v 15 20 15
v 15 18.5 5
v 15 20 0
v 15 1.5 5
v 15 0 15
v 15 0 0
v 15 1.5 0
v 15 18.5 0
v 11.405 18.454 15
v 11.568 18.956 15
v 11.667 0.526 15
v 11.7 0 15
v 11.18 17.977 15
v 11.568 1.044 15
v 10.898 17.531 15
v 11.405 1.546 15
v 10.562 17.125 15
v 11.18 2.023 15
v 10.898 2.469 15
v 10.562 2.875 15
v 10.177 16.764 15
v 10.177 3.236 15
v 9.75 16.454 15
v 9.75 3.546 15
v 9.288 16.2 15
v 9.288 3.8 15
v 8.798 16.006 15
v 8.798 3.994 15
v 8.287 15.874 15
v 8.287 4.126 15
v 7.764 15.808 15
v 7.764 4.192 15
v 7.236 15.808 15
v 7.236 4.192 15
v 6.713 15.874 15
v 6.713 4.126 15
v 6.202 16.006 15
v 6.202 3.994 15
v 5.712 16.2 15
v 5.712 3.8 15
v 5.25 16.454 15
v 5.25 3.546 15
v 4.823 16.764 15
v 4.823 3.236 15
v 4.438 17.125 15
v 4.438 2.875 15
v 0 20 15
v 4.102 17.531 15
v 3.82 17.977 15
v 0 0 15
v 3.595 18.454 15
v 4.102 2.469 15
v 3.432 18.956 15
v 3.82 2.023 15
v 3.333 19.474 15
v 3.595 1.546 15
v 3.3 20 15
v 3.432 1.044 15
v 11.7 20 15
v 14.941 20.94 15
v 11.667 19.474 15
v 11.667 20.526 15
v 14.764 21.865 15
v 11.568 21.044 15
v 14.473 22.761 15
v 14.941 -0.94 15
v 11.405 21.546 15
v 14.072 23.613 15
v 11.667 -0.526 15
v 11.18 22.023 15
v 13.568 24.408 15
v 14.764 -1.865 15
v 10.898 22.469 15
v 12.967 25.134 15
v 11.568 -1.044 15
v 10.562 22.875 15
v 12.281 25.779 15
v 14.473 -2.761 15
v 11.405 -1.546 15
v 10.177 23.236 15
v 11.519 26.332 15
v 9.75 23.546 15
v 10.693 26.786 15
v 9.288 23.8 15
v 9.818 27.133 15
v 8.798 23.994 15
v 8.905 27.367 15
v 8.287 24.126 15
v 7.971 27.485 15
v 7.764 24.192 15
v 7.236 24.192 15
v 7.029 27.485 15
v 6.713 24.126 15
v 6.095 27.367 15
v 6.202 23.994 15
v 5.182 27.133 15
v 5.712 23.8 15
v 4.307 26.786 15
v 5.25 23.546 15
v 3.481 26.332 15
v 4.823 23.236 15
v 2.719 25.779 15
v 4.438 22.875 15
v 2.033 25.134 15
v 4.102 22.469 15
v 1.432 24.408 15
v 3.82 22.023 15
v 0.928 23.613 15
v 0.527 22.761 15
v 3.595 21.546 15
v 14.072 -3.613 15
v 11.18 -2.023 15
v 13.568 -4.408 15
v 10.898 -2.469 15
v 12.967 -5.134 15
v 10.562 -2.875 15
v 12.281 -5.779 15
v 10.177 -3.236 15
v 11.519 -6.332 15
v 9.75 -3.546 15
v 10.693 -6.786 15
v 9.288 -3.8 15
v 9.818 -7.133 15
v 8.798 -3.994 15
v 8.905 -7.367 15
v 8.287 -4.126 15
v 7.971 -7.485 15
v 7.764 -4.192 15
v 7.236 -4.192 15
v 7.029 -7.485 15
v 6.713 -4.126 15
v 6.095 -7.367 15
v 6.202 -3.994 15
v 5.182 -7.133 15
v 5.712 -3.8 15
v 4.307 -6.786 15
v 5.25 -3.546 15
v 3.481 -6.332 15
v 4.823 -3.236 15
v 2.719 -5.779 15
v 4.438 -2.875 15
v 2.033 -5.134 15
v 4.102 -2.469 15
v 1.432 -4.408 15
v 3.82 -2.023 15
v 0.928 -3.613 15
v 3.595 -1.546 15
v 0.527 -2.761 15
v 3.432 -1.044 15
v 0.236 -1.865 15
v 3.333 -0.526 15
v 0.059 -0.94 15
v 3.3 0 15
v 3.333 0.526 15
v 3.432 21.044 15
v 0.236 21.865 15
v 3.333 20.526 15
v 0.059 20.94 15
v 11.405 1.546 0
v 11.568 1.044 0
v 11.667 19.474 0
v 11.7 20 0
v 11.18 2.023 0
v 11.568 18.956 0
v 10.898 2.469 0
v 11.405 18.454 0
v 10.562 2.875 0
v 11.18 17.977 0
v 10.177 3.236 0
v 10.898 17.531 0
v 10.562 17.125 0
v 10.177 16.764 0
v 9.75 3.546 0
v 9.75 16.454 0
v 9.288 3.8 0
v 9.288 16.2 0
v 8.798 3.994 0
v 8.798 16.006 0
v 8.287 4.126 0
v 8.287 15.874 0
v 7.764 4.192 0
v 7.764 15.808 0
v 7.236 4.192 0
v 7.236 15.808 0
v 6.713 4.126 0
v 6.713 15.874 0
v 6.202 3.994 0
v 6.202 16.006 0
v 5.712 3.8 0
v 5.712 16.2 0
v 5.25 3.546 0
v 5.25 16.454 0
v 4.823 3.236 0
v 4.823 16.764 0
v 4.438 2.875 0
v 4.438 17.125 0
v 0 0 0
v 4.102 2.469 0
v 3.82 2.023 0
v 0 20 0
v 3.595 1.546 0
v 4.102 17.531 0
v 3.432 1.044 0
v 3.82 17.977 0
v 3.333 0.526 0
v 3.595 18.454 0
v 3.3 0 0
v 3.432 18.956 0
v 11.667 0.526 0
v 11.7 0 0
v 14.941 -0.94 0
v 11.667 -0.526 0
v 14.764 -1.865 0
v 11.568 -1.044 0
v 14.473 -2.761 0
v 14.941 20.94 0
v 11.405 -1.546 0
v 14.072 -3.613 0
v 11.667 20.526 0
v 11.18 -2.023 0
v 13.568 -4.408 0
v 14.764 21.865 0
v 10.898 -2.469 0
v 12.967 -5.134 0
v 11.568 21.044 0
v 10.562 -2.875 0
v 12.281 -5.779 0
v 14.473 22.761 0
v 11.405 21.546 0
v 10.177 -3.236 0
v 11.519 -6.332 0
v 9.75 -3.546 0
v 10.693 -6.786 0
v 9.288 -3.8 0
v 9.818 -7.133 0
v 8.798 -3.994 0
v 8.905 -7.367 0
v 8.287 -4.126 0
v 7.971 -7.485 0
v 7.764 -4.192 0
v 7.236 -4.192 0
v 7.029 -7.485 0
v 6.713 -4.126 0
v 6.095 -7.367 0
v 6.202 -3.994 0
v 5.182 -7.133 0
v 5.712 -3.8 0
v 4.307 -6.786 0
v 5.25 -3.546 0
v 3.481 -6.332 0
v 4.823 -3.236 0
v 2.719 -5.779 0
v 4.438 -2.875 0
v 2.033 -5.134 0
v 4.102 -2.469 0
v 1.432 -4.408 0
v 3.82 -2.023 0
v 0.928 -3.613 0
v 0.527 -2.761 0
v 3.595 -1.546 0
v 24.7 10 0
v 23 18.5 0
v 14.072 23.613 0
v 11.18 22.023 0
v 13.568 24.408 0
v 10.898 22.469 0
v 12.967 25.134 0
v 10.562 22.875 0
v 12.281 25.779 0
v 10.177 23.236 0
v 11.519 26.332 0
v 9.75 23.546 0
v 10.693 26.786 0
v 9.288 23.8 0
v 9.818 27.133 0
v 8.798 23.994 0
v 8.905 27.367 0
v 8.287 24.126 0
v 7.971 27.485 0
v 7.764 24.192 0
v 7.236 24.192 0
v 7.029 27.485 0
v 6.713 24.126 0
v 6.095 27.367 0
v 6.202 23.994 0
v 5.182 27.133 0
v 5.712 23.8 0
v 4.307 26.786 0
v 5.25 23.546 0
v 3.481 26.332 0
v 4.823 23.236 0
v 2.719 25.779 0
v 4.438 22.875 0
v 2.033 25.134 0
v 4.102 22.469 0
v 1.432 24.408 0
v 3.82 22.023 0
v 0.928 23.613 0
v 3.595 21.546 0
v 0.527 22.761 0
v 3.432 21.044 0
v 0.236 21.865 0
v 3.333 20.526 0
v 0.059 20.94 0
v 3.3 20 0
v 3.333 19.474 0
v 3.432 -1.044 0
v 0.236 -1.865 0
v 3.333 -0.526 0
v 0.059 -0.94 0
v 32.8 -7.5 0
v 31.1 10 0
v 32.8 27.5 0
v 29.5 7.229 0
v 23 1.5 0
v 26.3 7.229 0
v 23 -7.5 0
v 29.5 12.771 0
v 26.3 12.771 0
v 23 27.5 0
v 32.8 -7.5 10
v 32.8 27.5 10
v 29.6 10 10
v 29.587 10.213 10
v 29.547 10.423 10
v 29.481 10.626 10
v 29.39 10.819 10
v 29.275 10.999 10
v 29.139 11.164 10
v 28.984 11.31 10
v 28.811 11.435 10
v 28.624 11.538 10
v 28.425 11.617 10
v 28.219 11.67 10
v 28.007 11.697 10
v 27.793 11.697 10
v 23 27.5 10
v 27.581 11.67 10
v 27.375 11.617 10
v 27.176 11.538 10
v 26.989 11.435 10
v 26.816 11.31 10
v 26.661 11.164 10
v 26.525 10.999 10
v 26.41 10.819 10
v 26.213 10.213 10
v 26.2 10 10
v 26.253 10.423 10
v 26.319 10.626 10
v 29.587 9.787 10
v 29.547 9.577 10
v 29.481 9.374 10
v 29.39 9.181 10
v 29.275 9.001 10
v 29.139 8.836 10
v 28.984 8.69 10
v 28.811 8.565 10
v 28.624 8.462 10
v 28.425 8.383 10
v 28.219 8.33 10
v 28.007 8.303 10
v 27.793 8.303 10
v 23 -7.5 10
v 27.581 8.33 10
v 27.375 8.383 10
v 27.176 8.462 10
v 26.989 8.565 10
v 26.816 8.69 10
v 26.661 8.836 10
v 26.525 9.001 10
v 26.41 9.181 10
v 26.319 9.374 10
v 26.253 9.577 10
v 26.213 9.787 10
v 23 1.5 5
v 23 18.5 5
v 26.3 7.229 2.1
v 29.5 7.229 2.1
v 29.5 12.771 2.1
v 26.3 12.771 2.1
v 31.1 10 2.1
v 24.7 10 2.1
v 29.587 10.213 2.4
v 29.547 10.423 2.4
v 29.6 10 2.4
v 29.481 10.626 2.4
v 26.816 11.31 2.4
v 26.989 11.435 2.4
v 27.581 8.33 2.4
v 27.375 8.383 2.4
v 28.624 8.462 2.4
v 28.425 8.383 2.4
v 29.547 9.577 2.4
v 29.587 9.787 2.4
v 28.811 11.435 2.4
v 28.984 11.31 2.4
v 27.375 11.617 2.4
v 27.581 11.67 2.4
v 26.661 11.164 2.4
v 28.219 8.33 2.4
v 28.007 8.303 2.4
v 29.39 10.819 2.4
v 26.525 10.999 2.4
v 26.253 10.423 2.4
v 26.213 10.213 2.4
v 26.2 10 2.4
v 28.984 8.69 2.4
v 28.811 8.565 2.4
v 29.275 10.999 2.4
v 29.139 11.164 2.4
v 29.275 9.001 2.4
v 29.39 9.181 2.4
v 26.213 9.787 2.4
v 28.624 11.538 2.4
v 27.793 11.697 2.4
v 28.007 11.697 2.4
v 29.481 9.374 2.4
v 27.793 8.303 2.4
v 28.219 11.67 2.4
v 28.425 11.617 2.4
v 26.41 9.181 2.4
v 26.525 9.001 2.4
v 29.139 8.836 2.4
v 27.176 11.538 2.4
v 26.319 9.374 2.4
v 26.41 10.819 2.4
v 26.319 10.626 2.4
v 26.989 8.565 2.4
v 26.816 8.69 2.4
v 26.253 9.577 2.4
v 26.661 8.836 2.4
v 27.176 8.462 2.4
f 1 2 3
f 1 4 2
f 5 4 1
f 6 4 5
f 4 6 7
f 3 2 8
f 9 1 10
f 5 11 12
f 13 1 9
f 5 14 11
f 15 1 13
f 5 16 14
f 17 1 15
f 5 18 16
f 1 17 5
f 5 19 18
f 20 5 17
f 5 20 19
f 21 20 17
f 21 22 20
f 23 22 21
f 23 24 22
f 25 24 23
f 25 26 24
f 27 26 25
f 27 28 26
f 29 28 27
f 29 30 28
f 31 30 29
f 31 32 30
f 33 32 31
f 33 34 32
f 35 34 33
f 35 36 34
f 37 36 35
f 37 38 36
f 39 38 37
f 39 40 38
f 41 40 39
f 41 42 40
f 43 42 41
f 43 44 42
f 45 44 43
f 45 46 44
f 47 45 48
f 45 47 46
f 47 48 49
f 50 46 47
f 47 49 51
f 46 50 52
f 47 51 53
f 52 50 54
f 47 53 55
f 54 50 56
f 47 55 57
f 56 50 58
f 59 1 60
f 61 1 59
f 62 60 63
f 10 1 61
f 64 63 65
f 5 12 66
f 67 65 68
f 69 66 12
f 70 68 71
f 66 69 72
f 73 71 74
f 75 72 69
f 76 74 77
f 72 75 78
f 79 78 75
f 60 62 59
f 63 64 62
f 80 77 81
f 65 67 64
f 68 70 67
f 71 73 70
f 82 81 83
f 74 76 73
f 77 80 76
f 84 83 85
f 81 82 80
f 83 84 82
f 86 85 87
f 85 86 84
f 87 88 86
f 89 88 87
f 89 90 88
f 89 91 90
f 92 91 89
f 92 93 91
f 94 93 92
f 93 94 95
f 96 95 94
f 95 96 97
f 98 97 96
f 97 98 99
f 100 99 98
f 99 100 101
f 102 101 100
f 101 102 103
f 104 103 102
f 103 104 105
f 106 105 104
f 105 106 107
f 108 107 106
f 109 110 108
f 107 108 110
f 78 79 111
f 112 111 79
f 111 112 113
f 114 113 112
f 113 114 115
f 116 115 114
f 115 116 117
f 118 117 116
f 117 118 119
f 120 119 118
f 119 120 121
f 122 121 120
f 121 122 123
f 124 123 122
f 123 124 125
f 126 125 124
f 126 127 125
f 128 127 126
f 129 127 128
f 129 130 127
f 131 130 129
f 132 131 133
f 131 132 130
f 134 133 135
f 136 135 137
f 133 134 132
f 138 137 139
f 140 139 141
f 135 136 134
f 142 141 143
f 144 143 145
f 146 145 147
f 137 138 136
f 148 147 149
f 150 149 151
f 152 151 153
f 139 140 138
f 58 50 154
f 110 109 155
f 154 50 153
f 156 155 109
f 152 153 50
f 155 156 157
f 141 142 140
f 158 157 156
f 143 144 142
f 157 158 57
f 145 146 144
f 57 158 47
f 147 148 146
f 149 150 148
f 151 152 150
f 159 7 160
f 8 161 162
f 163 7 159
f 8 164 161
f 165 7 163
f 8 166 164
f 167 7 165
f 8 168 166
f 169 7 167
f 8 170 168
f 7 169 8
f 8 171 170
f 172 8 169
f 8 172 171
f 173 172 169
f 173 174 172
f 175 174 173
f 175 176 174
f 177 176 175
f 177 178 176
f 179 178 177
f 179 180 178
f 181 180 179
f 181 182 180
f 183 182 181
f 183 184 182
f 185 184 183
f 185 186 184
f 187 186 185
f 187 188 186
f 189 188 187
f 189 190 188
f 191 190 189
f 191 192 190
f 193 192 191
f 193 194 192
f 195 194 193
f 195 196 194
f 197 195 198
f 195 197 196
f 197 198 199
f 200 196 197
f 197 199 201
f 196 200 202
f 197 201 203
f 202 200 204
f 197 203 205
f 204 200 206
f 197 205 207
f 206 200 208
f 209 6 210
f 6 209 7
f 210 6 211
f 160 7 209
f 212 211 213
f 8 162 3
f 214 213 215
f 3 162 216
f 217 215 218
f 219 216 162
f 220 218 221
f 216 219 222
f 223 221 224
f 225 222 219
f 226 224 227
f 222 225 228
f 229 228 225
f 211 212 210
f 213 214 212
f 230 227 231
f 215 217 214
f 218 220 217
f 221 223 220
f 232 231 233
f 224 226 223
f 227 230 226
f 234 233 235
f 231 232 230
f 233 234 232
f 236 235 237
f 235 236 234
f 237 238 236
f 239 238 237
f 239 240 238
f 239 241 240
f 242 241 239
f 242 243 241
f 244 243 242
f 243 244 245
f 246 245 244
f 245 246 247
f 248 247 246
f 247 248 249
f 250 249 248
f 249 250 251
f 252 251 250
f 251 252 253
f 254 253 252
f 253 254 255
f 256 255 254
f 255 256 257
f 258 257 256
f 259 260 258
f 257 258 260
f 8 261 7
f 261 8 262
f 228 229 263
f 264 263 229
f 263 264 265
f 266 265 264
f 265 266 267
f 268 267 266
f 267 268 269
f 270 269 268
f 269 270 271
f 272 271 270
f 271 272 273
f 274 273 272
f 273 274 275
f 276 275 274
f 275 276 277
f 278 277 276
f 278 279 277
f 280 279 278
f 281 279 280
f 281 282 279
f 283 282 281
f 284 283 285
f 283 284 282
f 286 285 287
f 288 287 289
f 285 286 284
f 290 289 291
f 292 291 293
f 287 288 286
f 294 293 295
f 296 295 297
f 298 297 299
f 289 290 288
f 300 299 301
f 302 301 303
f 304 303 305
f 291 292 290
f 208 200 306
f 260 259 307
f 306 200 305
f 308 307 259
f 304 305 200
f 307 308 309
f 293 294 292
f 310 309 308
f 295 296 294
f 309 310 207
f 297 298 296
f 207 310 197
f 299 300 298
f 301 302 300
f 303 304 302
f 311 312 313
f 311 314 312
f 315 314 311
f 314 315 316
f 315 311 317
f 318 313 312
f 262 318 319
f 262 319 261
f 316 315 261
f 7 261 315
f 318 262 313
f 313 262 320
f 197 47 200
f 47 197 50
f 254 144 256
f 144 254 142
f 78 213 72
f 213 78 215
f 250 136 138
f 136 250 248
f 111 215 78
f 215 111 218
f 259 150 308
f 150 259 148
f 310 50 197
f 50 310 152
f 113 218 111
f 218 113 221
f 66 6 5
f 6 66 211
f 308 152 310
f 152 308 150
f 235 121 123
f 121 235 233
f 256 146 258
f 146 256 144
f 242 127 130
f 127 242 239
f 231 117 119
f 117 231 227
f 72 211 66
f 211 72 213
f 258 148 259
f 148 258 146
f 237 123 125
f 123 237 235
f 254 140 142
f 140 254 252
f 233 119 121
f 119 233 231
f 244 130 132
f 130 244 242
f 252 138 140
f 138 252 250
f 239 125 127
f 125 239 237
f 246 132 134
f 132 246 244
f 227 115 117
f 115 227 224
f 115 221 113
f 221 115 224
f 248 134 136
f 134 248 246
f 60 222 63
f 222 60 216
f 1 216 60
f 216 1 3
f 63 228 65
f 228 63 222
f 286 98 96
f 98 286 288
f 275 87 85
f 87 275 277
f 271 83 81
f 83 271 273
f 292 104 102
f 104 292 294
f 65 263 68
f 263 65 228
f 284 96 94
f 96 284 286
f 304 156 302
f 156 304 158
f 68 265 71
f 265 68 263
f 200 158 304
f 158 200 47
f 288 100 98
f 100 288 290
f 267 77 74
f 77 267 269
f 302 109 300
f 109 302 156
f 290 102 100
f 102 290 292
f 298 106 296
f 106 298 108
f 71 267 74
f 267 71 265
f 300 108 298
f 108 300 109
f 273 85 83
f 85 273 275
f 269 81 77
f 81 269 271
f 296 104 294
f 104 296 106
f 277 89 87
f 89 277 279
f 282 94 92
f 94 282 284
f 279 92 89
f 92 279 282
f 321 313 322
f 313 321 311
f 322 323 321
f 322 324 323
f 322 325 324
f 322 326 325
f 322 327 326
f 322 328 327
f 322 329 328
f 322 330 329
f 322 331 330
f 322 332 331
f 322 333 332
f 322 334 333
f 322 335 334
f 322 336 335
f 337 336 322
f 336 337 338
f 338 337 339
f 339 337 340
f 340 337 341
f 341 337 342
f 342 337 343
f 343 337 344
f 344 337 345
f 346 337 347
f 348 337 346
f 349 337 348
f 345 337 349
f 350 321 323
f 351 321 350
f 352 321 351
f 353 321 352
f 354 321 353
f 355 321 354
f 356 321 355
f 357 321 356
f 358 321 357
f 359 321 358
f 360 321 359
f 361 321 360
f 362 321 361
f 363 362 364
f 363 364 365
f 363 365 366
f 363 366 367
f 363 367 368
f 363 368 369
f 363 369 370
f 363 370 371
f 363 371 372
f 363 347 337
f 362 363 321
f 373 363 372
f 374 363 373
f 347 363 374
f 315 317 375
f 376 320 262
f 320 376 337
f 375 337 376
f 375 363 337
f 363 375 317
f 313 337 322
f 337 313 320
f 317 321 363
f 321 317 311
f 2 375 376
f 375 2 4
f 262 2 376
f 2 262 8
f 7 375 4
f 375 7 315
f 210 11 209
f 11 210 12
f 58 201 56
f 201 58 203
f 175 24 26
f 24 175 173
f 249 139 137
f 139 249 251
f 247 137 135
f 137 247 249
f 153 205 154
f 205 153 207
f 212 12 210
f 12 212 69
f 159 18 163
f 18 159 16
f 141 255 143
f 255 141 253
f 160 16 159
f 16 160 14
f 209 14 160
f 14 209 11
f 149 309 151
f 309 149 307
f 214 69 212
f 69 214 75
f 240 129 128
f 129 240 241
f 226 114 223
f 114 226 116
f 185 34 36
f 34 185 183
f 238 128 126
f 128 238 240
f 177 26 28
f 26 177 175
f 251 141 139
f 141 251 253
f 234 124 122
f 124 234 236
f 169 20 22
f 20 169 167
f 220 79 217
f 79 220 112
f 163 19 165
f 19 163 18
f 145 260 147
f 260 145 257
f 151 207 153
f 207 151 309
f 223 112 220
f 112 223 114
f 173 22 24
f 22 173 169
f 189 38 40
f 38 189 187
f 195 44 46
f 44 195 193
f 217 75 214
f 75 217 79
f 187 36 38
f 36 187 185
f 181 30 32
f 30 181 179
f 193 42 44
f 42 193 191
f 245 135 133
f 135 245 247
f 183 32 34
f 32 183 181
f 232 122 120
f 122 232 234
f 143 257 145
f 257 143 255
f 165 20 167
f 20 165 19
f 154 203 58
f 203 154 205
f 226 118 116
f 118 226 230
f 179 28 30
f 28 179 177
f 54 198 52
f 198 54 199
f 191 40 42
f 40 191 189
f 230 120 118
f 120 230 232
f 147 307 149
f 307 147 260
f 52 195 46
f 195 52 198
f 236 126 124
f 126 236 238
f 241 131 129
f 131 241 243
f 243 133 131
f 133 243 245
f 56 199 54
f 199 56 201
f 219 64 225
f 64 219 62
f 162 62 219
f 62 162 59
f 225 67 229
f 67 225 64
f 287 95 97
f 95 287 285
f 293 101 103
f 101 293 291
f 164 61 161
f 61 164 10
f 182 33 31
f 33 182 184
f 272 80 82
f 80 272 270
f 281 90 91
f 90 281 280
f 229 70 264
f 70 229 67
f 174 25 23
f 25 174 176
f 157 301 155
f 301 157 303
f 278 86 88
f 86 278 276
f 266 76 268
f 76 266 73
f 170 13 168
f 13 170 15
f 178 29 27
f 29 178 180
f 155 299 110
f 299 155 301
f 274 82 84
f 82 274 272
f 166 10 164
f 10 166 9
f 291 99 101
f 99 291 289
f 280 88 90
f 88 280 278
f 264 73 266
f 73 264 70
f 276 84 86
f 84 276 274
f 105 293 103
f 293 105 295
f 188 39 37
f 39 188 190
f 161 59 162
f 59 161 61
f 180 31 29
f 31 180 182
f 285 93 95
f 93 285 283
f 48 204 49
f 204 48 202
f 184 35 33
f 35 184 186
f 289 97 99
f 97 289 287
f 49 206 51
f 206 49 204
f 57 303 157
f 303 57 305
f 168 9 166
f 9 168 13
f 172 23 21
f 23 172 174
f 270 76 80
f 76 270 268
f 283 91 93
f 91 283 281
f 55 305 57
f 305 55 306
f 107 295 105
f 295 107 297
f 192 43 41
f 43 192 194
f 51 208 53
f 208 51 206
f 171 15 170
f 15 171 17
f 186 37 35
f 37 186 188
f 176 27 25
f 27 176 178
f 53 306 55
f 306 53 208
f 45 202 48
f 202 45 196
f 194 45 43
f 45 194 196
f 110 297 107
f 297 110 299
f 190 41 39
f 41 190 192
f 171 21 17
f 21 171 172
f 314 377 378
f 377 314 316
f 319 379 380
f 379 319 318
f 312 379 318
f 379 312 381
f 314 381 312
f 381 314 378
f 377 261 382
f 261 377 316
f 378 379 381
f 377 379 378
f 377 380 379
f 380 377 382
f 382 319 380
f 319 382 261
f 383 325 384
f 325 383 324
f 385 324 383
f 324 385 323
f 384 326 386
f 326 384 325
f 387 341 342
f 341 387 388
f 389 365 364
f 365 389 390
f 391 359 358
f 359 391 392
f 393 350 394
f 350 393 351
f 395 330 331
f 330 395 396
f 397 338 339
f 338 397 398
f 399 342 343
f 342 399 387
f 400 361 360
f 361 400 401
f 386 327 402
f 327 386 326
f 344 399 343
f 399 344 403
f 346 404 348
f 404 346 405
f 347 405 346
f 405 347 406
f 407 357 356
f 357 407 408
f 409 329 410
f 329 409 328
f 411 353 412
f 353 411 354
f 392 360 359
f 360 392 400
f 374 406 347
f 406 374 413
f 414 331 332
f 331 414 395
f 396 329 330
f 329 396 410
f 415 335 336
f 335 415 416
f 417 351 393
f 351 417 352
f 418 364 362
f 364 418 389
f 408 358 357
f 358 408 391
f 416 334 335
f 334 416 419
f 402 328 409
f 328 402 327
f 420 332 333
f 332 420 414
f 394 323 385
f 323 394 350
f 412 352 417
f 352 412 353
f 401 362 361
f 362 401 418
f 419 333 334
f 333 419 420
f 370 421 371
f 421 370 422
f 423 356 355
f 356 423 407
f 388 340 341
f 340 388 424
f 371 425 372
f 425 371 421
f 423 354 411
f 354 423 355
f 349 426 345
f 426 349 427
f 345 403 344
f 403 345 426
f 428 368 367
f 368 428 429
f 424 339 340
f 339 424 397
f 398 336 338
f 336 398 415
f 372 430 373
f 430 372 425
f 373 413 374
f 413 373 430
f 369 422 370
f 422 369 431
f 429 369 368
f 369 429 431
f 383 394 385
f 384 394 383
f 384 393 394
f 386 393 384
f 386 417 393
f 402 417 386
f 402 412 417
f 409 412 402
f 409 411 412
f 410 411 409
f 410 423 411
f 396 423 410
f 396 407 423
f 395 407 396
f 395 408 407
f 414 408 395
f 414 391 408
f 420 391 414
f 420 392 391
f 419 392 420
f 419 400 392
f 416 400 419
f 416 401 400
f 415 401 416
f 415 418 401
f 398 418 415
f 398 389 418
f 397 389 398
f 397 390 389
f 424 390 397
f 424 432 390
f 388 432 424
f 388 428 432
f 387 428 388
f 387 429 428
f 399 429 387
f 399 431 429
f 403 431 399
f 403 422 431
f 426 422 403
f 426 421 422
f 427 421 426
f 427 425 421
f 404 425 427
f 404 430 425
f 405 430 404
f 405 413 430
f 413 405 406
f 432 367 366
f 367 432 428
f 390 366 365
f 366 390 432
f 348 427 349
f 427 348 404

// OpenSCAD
//Settings

layer_thickness=0.3;

//parameters

hole_1=4.2;
hole_2=3.2;
hole_3=1.7;

size_1=7.5;
size_2=20;
size_3=8;
size_4=9.8;
size_5=10;
size_6=9;

hight_1=15;
hight_2=5;
hight_3=10;
hight_4=7*layer_thickness;



resolution=50;

module body(){
	cube(size = [2*size_1,size_2,hight_1]);
	translate([size_1,0,0])
		cylinder(h=hight_1,r=size_1, $fn=resolution);
	translate([size_1,size_2,0])
		cylinder(h=hight_1,r=size_1, $fn=resolution);
	translate([2*size_1+size_3,-size_1,0])
		cube(size = [size_4,size_2+2*size_1,hight_3]);
	translate([2*size_1,-size_1+size_6,0])
		cube(size = [size_3,2*size_1+size_2-2*size_6,hight_2]);
}



module hole(){
	difference() {
		body();
		translate([size_1,0,0])
			cylinder (h = hight_1, r=hole_1, $fn=resolution);
		translate([size_1,size_2,0])
			cylinder (h = hight_1, r=hole_1, $fn=resolution);
		translate([2*size_1+size_3+size_4/2,size_2/2,0])
			cylinder (h = hight_4, r=hole_2, $fn=6);
		translate([2*size_1+size_3+size_4/2,size_2/2,hight_4+layer_thickness])
			cylinder (h = hight_3, r=hole_3, $fn=resolution);
	}
}

hole();
